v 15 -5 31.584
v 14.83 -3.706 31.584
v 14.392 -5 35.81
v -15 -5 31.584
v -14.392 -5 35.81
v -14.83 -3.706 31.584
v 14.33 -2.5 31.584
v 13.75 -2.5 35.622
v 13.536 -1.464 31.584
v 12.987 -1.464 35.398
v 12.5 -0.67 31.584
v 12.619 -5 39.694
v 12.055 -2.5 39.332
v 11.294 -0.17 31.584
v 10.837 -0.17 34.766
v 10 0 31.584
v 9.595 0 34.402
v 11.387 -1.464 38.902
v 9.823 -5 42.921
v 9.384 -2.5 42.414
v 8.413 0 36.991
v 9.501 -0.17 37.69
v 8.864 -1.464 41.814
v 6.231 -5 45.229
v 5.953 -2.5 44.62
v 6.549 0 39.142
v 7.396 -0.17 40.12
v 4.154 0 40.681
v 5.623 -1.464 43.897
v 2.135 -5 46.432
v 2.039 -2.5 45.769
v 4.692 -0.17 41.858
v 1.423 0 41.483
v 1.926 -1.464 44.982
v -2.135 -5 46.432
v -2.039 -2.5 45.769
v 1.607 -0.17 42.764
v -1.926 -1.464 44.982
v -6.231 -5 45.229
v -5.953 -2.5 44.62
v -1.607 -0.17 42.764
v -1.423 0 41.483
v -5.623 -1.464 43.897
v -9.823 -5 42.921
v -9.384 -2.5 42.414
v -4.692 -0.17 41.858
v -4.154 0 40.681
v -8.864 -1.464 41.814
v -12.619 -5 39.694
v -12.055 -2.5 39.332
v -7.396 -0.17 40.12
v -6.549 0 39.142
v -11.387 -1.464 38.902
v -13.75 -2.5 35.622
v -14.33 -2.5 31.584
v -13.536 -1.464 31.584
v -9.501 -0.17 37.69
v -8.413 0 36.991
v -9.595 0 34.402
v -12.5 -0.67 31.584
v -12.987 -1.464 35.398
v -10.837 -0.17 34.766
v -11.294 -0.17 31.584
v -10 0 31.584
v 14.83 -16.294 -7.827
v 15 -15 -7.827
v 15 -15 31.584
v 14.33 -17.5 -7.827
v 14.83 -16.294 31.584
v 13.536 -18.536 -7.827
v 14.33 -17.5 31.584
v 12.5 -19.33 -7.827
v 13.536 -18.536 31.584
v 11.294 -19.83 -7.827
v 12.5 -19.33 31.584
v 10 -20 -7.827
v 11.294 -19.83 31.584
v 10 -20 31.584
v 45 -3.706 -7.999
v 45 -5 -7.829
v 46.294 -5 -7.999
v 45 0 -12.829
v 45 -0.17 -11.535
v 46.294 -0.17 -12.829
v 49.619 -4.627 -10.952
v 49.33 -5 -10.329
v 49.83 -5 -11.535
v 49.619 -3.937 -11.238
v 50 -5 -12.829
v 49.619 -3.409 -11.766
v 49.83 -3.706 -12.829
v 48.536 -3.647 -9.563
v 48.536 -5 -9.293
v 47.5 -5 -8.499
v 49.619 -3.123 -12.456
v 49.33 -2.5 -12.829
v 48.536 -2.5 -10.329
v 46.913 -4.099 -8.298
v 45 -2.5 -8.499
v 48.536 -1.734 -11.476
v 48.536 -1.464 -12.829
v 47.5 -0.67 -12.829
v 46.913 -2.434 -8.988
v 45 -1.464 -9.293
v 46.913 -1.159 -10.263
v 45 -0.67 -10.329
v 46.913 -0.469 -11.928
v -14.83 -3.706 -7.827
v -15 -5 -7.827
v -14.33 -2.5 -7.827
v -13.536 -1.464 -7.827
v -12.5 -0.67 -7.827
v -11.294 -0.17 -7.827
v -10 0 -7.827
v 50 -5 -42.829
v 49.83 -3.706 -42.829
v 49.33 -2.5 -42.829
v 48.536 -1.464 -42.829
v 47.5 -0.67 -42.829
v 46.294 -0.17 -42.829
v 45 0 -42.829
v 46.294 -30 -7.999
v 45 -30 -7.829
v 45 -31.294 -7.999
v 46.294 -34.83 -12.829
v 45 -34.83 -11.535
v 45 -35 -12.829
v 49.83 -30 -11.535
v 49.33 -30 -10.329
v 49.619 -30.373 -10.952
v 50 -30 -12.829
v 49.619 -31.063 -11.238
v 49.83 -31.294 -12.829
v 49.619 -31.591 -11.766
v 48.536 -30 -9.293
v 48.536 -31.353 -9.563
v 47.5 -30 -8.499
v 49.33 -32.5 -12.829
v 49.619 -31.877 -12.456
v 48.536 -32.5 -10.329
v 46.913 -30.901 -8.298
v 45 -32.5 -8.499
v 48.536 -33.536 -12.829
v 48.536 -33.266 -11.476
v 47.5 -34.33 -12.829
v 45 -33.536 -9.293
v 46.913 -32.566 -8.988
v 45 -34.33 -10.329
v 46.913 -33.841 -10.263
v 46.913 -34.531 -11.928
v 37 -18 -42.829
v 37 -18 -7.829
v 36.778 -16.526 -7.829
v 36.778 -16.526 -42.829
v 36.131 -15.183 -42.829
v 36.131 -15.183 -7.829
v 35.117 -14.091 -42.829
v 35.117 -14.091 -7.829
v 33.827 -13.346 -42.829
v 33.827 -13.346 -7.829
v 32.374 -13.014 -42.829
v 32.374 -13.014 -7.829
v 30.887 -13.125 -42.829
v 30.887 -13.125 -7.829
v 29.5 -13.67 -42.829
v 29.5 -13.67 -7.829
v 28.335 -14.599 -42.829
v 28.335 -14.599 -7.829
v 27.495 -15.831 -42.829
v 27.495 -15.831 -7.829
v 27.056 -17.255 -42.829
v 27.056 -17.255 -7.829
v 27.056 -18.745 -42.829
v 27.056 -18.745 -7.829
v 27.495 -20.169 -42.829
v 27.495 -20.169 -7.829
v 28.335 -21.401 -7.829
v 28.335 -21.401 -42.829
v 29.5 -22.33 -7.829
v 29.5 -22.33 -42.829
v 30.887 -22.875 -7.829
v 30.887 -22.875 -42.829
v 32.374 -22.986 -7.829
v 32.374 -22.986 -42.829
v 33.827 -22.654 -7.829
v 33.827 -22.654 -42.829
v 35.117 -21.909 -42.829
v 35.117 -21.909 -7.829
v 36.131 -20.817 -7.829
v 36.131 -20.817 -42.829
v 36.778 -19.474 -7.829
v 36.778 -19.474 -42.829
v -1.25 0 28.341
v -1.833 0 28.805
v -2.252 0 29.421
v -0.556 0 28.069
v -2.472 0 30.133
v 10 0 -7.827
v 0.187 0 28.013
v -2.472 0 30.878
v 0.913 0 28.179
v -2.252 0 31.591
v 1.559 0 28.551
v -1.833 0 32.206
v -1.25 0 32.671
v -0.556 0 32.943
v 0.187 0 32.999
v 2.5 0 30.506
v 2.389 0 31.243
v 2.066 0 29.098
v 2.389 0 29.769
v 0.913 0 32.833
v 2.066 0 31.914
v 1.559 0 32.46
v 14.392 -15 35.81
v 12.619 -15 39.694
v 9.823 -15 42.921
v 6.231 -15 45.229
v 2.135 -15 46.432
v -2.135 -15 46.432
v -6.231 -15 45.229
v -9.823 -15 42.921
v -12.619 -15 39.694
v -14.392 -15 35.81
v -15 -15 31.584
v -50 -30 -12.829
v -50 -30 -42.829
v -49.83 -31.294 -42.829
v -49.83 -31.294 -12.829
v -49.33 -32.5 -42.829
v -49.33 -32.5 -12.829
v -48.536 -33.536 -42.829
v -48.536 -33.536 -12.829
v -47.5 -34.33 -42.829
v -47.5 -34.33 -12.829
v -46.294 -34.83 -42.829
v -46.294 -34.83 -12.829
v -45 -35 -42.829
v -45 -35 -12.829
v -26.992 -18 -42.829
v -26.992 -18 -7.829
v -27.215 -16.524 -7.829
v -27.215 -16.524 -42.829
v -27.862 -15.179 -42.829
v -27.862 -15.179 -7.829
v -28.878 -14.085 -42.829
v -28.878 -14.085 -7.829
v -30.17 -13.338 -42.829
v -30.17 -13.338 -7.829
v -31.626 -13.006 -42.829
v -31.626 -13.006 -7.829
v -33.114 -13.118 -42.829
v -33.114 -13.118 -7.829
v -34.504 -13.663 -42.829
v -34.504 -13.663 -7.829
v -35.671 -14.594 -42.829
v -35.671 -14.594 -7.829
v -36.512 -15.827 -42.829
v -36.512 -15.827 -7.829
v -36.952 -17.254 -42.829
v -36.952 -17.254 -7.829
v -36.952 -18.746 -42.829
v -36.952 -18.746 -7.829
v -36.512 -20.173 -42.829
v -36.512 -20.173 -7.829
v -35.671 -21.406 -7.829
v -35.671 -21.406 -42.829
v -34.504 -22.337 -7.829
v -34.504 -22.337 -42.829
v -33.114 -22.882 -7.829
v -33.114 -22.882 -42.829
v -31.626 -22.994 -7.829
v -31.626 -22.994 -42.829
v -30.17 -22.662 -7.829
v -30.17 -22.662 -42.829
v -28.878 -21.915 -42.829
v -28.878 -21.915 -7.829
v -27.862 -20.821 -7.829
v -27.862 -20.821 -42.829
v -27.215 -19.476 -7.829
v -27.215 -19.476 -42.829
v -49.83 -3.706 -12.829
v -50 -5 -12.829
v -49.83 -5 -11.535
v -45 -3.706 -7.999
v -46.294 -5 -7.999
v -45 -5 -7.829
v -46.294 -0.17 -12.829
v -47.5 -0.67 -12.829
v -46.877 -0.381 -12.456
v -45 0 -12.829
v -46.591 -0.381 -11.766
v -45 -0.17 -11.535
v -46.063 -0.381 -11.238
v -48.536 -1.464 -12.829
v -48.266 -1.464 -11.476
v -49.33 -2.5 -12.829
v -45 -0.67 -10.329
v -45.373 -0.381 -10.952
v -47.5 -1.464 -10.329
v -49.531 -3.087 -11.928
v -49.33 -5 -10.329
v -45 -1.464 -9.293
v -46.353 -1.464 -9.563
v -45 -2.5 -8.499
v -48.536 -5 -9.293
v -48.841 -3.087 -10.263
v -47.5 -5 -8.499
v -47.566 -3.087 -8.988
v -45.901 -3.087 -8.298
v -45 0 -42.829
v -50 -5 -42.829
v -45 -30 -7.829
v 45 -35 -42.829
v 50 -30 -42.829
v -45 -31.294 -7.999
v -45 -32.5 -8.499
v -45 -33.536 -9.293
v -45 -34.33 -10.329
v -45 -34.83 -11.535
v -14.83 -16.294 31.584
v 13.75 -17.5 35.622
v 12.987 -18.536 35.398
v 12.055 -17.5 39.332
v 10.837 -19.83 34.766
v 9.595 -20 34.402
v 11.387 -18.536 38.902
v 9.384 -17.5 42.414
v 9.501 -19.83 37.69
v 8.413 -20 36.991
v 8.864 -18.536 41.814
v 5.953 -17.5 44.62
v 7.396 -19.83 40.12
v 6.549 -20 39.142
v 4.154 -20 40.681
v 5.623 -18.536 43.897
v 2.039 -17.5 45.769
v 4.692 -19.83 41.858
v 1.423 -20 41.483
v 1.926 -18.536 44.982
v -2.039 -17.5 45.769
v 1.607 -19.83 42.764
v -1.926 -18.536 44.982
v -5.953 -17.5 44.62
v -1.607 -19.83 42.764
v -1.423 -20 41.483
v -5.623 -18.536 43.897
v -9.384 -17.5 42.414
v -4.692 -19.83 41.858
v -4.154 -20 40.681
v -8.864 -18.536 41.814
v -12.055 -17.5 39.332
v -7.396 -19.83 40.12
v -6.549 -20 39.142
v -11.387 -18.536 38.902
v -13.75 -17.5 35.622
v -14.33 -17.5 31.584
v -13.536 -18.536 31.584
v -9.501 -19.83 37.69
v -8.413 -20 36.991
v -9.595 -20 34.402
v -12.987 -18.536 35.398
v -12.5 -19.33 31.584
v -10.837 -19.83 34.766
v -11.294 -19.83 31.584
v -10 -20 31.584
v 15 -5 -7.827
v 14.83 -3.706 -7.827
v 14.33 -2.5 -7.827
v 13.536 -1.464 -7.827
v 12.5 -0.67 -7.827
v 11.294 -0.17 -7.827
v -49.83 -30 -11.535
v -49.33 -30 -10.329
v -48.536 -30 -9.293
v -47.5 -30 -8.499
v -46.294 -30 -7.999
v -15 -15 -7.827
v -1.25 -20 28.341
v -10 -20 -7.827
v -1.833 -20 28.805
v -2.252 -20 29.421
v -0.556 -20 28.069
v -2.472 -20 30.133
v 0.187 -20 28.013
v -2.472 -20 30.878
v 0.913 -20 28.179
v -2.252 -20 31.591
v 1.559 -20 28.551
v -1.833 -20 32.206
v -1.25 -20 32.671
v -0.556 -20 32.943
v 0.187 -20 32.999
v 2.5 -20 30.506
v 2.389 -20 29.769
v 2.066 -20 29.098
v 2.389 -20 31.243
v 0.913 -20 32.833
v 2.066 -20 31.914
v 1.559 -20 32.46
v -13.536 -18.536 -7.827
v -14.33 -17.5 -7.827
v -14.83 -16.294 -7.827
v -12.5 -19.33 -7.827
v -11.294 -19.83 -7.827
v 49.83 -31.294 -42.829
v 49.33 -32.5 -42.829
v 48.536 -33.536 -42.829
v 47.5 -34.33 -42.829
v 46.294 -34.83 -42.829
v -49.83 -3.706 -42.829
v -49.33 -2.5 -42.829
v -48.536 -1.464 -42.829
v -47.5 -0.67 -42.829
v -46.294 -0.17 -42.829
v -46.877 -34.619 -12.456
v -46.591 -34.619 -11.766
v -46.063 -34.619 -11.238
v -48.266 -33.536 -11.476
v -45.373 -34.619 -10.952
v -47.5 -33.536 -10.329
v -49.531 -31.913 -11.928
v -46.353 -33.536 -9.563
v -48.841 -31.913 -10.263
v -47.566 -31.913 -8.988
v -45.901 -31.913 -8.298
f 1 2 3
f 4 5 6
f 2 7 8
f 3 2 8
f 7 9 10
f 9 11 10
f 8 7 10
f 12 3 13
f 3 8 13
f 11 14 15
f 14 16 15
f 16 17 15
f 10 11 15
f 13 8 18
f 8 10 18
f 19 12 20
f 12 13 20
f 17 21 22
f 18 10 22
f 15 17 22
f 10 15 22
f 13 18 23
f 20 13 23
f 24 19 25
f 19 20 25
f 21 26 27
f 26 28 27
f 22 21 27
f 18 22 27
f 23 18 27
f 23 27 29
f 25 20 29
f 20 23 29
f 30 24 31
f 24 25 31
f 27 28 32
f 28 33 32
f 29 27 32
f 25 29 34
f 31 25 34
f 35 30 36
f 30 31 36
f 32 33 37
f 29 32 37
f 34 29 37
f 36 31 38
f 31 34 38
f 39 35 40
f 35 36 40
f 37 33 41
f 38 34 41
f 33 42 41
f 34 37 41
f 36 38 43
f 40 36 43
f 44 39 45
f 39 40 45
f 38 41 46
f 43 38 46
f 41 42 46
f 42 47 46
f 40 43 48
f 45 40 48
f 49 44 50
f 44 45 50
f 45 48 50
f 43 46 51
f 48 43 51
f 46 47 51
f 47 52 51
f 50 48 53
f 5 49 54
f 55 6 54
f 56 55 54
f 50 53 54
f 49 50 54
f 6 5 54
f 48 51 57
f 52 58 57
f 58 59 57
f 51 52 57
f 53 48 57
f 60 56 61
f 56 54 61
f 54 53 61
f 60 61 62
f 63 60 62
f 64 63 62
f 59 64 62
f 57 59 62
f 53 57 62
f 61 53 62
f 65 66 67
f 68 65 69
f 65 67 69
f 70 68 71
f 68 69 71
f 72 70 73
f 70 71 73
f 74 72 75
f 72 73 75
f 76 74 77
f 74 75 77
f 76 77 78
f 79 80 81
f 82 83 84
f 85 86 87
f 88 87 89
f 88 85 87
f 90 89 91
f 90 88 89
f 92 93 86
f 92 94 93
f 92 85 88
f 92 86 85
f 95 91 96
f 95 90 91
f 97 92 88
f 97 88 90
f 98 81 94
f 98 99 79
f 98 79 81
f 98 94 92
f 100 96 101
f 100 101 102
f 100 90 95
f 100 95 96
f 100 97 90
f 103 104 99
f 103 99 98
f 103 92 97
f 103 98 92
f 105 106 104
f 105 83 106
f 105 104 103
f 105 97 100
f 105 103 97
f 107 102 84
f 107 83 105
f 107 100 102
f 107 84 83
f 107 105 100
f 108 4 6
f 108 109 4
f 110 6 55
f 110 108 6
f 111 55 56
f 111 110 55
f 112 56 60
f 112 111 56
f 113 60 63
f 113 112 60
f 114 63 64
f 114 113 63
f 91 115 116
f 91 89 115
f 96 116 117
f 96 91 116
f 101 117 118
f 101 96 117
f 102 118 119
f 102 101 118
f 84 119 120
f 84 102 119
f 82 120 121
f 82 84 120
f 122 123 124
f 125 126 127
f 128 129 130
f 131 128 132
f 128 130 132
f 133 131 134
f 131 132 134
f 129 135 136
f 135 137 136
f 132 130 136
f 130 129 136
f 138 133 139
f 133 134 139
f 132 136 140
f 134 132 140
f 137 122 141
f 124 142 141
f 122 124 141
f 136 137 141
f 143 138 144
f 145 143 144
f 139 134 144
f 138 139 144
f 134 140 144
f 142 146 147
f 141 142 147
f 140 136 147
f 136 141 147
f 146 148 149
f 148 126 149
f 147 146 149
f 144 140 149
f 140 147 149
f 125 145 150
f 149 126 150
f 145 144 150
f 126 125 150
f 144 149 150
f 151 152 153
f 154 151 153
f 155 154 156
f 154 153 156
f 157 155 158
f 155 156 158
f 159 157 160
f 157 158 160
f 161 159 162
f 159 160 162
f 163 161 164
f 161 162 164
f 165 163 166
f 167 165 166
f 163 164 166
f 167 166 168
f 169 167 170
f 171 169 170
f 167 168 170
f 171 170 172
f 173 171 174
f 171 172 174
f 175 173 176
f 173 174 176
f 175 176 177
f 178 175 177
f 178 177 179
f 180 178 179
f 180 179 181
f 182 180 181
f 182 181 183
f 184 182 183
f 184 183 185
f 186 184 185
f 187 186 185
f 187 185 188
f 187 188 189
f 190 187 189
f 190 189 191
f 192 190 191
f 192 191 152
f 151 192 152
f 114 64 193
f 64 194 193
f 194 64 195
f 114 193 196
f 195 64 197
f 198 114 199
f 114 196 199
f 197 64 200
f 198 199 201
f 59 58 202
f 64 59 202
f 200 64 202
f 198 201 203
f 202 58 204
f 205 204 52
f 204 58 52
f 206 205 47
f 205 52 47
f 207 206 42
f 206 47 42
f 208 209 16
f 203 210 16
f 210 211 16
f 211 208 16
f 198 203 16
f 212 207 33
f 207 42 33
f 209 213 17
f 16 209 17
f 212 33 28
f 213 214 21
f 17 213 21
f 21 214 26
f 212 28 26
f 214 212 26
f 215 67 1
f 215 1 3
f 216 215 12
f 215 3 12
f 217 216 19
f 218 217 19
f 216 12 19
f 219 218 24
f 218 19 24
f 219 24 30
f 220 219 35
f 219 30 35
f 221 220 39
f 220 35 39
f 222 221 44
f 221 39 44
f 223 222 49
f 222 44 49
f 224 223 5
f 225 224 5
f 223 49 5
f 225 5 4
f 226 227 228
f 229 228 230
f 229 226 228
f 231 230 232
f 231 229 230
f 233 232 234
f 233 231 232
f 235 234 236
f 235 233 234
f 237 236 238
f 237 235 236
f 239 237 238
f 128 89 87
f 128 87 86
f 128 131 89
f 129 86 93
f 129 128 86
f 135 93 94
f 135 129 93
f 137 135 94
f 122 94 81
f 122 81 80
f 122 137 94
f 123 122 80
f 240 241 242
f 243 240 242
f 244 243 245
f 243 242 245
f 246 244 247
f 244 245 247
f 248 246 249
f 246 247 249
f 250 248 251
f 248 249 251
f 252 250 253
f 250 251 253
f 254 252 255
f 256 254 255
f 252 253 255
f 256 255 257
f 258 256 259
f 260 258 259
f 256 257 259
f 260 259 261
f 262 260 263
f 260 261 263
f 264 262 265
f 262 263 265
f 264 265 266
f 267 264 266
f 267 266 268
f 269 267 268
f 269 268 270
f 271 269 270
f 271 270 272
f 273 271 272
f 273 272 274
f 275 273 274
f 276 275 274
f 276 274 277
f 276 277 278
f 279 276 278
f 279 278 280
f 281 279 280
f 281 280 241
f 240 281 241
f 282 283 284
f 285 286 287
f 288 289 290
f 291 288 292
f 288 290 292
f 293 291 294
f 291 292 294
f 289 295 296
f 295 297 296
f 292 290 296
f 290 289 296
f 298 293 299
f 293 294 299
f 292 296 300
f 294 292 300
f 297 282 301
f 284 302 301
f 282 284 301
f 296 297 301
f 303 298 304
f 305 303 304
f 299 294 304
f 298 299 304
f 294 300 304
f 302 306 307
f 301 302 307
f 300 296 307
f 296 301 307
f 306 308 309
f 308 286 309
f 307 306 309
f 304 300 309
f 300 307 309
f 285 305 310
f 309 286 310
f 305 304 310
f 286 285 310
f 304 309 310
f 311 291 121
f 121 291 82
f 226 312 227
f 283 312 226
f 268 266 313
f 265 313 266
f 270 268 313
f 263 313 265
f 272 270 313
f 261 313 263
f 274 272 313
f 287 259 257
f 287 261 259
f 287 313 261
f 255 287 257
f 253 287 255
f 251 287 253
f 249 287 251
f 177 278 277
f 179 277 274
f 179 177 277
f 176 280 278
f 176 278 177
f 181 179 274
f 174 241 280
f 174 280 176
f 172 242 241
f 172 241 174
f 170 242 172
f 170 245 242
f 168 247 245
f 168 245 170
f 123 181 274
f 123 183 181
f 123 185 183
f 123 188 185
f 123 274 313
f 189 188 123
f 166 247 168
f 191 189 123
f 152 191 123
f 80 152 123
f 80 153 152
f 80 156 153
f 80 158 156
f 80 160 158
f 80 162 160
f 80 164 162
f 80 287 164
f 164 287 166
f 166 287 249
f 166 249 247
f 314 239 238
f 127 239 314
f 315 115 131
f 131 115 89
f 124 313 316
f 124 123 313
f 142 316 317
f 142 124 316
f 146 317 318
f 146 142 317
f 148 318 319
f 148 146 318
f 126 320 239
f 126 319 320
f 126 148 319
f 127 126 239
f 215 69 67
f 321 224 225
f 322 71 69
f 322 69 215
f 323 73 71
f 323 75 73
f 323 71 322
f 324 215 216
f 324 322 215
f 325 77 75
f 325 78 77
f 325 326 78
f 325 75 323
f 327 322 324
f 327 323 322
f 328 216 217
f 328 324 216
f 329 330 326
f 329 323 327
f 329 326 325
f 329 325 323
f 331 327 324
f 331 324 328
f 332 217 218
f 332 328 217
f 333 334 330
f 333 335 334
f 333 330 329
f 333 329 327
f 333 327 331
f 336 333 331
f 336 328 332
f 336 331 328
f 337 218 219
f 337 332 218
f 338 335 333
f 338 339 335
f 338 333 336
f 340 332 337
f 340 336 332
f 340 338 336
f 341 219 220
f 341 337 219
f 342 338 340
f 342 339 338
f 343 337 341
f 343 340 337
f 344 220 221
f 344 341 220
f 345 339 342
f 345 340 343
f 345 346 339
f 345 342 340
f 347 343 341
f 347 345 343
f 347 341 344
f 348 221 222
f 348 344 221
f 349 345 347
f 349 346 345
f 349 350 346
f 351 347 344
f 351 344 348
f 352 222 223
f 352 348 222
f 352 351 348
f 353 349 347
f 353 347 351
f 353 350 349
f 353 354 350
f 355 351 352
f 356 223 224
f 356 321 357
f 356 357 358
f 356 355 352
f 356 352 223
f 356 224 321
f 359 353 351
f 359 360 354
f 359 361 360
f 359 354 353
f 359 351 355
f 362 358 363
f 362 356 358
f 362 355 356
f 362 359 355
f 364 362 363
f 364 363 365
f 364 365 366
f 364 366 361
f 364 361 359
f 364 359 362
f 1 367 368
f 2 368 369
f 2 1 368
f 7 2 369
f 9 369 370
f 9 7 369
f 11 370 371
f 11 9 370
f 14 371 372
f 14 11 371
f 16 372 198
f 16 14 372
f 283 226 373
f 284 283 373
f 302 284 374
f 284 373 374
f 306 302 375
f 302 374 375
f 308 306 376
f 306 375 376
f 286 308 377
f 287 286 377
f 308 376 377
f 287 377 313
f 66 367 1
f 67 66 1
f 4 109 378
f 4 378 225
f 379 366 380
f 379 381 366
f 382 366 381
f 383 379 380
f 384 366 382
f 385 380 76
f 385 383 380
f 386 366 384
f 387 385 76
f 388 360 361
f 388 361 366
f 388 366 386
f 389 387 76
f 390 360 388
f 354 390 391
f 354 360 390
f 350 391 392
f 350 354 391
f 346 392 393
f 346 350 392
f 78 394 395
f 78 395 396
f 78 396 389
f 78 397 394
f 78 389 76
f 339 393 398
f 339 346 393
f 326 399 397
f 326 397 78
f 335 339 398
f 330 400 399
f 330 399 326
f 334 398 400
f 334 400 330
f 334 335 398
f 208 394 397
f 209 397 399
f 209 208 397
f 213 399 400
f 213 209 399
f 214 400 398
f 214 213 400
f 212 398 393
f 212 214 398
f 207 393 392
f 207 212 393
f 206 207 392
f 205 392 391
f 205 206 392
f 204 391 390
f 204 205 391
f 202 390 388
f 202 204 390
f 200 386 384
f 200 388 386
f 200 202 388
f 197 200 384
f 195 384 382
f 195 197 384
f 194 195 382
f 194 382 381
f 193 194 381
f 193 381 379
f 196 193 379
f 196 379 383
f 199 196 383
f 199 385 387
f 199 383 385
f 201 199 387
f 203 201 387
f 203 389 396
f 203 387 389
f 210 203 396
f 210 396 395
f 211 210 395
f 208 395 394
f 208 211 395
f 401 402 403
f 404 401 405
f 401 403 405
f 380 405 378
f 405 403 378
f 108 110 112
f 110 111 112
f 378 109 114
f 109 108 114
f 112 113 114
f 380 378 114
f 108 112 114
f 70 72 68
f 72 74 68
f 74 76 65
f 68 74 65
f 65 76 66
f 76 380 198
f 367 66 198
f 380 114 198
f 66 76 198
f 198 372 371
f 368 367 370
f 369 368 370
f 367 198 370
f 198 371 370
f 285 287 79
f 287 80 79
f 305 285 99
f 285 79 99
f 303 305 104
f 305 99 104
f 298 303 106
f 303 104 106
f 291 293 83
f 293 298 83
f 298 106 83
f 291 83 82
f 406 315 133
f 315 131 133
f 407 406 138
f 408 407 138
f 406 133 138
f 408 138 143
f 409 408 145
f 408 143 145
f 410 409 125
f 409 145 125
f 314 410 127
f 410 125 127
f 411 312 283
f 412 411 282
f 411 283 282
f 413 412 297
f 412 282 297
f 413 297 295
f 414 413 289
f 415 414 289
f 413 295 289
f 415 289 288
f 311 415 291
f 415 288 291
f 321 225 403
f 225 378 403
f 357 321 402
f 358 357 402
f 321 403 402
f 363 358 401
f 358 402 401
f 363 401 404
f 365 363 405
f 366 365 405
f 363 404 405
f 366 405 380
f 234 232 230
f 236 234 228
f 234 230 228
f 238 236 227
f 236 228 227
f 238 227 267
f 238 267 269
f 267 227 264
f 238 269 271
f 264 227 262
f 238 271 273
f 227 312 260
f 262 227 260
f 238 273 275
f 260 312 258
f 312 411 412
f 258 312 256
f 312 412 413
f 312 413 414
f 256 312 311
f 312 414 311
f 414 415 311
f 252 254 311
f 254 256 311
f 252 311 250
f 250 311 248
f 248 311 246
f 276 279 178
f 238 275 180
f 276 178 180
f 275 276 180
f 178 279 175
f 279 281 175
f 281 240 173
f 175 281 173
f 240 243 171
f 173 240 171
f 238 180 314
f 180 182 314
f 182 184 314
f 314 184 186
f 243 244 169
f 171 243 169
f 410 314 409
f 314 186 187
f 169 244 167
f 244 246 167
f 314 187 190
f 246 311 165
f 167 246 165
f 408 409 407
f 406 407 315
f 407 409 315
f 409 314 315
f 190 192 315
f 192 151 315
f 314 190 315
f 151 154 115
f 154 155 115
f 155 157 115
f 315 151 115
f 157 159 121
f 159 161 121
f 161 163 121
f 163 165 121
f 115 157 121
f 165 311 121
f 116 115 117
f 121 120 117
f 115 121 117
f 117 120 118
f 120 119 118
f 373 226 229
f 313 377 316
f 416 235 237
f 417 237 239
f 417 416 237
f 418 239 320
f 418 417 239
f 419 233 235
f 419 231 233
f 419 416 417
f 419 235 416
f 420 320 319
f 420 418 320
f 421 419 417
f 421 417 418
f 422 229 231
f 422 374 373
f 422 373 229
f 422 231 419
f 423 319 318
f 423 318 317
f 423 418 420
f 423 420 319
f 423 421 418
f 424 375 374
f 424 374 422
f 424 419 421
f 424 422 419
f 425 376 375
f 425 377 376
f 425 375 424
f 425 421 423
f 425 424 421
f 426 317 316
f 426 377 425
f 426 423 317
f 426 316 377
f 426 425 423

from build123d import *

# Parameters (mm, degrees)
F0_W     = 100
F0_H     = 35
F1_DEPTH = 35
F2_W     = 30
F2_H     = 39.4117633874
F3_DEPTH = 20
F4_R     = 5
F4_2_R   = 5
F5_R     = 5.0079827635
F5_R_2   = 5
F6_DEPTH = 50
F7_R     = 2.5
F8_DEPTH = 30


with BuildPart() as f1:
    # F0 (on Front) → F1 (new body)
    with BuildSketch(Plane.XZ):
        with Locations((0, -25.3289474839)):
            Rectangle(F0_W, F0_H)
    extrude(amount=F1_DEPTH)

    # F4#2
    f4_2_edges = [f1.edges().sort_by_distance(p)[0] for p in [
        (-50, -17.5, -7.828947),
        (-50, 0, -25.328947),
        (-50, -35, -25.328947),
        (0, 0, -7.828947),
        (0, -35, -7.828947),
        (50, -17.5, -7.828947),
        (50, -35, -25.328947),
        (50, 0, -25.328947),
    ]]
    fillet(f4_2_edges, radius=F4_2_R)

    # F5 (on Top) → F6 (cut)
    with BuildSketch(Plane.XY):
        with Locations((-32, -18)):
            Circle(F5_R)
        with Locations((32, -18)):
            Circle(F5_R_2)
    extrude(amount=-F6_DEPTH, mode=Mode.SUBTRACT)


with BuildPart() as f3:
    # F2 (on Front) → F3 (new body)
    with BuildSketch(Plane.XZ):
        with Locations((0, 11.8784913793)):
            Rectangle(F2_W, F2_H)
        with BuildLine():
            ThreePointArc((15, 31.584373073), (0, 46.584373073), (-15, 31.584373073))
            Line((-15, 31.584373073), (15, 31.584373073))
        make_face()
    extrude(amount=F3_DEPTH)

    # F4
    f4_edges = [f3.edges().sort_by_distance(p)[0] for p in [
        (0, 0, 46.584373),
        (0, -20, 46.584373),
    ]]
    fillet(f4_edges, radius=F4_R)

    # F7 (on Front) → F8 (cut)
    with BuildSketch(Plane.XZ):
        with Locations((0, 30.5058586667)):
            Circle(F7_R)
    extrude(amount=F8_DEPTH, mode=Mode.SUBTRACT)


solid = Compound([f1.part, f3.part])
